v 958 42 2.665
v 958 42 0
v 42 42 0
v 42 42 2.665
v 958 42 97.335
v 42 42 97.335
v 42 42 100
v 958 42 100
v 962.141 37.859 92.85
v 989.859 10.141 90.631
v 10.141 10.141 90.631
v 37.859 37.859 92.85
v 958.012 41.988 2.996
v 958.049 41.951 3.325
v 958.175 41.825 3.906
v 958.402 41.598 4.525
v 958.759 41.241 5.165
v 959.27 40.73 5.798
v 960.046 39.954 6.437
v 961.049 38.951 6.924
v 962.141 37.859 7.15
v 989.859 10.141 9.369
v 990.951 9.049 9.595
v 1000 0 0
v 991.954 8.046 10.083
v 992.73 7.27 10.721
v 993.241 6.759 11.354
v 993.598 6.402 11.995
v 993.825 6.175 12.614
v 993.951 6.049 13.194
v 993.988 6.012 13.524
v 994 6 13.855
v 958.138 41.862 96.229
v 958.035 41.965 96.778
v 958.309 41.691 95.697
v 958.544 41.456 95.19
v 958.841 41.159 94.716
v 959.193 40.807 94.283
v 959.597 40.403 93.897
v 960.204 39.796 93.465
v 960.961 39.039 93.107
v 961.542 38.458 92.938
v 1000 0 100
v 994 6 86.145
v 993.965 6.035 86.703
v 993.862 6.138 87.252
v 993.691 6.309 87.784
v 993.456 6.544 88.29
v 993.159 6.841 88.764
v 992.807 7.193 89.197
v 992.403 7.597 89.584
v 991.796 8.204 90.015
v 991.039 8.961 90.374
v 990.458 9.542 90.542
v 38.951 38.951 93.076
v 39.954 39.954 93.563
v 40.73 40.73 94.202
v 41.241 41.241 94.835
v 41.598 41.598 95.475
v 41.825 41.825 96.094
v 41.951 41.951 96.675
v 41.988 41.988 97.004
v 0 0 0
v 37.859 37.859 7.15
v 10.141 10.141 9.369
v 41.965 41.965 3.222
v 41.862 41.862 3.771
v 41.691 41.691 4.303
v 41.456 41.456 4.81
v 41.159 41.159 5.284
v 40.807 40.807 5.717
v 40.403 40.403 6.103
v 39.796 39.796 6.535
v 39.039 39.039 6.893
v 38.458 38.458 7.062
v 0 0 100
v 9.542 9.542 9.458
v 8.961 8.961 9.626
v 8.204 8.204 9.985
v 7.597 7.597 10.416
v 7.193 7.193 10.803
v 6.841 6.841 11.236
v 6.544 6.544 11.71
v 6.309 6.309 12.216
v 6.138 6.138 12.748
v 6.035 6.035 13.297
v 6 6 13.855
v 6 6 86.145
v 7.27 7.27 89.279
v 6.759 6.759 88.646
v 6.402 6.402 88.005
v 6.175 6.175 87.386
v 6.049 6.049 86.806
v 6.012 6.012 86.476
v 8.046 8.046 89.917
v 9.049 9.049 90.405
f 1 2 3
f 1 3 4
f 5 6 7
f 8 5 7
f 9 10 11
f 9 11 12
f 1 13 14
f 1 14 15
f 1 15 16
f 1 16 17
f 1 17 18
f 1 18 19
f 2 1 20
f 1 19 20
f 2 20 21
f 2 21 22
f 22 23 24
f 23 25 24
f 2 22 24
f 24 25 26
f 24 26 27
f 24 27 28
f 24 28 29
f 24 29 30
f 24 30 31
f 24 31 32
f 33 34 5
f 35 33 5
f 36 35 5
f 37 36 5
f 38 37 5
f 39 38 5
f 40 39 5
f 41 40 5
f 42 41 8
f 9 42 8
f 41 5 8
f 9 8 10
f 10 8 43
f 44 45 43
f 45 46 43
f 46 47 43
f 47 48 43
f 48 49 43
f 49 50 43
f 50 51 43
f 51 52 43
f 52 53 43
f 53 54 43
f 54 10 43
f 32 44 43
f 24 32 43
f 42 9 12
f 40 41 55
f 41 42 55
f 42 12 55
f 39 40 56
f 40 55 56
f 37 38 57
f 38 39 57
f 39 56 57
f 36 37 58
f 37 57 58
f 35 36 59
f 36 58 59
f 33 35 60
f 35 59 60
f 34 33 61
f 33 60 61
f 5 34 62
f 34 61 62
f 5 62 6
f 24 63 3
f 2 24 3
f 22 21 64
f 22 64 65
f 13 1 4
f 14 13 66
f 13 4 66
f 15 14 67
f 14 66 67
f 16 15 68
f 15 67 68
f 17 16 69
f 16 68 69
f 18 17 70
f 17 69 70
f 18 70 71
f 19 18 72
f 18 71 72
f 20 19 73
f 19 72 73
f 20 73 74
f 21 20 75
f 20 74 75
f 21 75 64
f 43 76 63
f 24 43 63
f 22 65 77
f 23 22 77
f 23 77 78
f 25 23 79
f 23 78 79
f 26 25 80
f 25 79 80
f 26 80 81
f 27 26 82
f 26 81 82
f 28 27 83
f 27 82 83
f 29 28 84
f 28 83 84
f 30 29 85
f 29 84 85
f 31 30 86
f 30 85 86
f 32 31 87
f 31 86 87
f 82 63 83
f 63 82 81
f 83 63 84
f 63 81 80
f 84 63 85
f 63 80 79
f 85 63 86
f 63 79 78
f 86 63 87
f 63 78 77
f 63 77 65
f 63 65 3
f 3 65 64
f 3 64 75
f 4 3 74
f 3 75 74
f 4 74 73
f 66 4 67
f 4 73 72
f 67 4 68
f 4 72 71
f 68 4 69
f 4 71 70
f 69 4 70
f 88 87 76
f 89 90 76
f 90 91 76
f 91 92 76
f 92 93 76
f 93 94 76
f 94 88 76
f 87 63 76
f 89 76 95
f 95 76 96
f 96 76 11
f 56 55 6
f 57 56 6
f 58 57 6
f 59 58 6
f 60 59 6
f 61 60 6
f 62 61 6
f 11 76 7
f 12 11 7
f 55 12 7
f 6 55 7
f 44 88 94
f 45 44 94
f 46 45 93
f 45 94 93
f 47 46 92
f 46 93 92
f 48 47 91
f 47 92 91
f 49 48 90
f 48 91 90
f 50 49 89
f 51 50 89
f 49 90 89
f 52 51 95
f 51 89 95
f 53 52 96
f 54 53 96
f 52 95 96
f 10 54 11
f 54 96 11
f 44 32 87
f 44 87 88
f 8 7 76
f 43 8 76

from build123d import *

# Parameters (mm, degrees)
F1_DEPTH = 1000
F3_DEPTH = 100.001
F5_DEPTH = 100.001


with BuildPart() as f1:
    # F0 (on Right) → F1 (new body)
    with BuildSketch(Plane.YZ):
        with BuildLine():
            Line((0, 100), (0, 0))
            Line((0, 0), (42, 0))
            Line((42, 0), (42, 2.664711))
            ThreePointArc((42, 2.664711), (40.806503, 5.717093), (37.859095, 7.150361))
            Line((37.859095, 7.150361), (10.140905, 9.369315))
            ThreePointArc((10.140905, 9.369315), (7.193497, 10.802582), (6, 13.854964))
            Line((6, 13.854964), (6, 86.145036))
            ThreePointArc((6, 86.145036), (7.193497, 89.197418), (10.140905, 90.630685))
            Line((10.140905, 90.630685), (37.859095, 92.849639))
            ThreePointArc((37.859095, 92.849639), (40.806503, 94.282907), (42, 97.335289))
            Line((42, 97.335289), (42, 100))
            Line((42, 100), (0, 100))
        make_face()
    extrude(amount=F1_DEPTH)

    # F2 (on face) → F3 (cut, through all)
    with BuildSketch(Plane.XY.offset(100)):
        Polygon((958, 42), (1000, 0), (1000, 42), align=None)
    extrude(amount=-F3_DEPTH, mode=Mode.SUBTRACT)

    # F4 (on face) → F5 (cut, through all)
    with BuildSketch(Plane.XY.offset(100)):
        Polygon((0, 42), (0, 0), (42, 42), align=None)
    extrude(amount=-F5_DEPTH, mode=Mode.SUBTRACT)


solid = f1.part
